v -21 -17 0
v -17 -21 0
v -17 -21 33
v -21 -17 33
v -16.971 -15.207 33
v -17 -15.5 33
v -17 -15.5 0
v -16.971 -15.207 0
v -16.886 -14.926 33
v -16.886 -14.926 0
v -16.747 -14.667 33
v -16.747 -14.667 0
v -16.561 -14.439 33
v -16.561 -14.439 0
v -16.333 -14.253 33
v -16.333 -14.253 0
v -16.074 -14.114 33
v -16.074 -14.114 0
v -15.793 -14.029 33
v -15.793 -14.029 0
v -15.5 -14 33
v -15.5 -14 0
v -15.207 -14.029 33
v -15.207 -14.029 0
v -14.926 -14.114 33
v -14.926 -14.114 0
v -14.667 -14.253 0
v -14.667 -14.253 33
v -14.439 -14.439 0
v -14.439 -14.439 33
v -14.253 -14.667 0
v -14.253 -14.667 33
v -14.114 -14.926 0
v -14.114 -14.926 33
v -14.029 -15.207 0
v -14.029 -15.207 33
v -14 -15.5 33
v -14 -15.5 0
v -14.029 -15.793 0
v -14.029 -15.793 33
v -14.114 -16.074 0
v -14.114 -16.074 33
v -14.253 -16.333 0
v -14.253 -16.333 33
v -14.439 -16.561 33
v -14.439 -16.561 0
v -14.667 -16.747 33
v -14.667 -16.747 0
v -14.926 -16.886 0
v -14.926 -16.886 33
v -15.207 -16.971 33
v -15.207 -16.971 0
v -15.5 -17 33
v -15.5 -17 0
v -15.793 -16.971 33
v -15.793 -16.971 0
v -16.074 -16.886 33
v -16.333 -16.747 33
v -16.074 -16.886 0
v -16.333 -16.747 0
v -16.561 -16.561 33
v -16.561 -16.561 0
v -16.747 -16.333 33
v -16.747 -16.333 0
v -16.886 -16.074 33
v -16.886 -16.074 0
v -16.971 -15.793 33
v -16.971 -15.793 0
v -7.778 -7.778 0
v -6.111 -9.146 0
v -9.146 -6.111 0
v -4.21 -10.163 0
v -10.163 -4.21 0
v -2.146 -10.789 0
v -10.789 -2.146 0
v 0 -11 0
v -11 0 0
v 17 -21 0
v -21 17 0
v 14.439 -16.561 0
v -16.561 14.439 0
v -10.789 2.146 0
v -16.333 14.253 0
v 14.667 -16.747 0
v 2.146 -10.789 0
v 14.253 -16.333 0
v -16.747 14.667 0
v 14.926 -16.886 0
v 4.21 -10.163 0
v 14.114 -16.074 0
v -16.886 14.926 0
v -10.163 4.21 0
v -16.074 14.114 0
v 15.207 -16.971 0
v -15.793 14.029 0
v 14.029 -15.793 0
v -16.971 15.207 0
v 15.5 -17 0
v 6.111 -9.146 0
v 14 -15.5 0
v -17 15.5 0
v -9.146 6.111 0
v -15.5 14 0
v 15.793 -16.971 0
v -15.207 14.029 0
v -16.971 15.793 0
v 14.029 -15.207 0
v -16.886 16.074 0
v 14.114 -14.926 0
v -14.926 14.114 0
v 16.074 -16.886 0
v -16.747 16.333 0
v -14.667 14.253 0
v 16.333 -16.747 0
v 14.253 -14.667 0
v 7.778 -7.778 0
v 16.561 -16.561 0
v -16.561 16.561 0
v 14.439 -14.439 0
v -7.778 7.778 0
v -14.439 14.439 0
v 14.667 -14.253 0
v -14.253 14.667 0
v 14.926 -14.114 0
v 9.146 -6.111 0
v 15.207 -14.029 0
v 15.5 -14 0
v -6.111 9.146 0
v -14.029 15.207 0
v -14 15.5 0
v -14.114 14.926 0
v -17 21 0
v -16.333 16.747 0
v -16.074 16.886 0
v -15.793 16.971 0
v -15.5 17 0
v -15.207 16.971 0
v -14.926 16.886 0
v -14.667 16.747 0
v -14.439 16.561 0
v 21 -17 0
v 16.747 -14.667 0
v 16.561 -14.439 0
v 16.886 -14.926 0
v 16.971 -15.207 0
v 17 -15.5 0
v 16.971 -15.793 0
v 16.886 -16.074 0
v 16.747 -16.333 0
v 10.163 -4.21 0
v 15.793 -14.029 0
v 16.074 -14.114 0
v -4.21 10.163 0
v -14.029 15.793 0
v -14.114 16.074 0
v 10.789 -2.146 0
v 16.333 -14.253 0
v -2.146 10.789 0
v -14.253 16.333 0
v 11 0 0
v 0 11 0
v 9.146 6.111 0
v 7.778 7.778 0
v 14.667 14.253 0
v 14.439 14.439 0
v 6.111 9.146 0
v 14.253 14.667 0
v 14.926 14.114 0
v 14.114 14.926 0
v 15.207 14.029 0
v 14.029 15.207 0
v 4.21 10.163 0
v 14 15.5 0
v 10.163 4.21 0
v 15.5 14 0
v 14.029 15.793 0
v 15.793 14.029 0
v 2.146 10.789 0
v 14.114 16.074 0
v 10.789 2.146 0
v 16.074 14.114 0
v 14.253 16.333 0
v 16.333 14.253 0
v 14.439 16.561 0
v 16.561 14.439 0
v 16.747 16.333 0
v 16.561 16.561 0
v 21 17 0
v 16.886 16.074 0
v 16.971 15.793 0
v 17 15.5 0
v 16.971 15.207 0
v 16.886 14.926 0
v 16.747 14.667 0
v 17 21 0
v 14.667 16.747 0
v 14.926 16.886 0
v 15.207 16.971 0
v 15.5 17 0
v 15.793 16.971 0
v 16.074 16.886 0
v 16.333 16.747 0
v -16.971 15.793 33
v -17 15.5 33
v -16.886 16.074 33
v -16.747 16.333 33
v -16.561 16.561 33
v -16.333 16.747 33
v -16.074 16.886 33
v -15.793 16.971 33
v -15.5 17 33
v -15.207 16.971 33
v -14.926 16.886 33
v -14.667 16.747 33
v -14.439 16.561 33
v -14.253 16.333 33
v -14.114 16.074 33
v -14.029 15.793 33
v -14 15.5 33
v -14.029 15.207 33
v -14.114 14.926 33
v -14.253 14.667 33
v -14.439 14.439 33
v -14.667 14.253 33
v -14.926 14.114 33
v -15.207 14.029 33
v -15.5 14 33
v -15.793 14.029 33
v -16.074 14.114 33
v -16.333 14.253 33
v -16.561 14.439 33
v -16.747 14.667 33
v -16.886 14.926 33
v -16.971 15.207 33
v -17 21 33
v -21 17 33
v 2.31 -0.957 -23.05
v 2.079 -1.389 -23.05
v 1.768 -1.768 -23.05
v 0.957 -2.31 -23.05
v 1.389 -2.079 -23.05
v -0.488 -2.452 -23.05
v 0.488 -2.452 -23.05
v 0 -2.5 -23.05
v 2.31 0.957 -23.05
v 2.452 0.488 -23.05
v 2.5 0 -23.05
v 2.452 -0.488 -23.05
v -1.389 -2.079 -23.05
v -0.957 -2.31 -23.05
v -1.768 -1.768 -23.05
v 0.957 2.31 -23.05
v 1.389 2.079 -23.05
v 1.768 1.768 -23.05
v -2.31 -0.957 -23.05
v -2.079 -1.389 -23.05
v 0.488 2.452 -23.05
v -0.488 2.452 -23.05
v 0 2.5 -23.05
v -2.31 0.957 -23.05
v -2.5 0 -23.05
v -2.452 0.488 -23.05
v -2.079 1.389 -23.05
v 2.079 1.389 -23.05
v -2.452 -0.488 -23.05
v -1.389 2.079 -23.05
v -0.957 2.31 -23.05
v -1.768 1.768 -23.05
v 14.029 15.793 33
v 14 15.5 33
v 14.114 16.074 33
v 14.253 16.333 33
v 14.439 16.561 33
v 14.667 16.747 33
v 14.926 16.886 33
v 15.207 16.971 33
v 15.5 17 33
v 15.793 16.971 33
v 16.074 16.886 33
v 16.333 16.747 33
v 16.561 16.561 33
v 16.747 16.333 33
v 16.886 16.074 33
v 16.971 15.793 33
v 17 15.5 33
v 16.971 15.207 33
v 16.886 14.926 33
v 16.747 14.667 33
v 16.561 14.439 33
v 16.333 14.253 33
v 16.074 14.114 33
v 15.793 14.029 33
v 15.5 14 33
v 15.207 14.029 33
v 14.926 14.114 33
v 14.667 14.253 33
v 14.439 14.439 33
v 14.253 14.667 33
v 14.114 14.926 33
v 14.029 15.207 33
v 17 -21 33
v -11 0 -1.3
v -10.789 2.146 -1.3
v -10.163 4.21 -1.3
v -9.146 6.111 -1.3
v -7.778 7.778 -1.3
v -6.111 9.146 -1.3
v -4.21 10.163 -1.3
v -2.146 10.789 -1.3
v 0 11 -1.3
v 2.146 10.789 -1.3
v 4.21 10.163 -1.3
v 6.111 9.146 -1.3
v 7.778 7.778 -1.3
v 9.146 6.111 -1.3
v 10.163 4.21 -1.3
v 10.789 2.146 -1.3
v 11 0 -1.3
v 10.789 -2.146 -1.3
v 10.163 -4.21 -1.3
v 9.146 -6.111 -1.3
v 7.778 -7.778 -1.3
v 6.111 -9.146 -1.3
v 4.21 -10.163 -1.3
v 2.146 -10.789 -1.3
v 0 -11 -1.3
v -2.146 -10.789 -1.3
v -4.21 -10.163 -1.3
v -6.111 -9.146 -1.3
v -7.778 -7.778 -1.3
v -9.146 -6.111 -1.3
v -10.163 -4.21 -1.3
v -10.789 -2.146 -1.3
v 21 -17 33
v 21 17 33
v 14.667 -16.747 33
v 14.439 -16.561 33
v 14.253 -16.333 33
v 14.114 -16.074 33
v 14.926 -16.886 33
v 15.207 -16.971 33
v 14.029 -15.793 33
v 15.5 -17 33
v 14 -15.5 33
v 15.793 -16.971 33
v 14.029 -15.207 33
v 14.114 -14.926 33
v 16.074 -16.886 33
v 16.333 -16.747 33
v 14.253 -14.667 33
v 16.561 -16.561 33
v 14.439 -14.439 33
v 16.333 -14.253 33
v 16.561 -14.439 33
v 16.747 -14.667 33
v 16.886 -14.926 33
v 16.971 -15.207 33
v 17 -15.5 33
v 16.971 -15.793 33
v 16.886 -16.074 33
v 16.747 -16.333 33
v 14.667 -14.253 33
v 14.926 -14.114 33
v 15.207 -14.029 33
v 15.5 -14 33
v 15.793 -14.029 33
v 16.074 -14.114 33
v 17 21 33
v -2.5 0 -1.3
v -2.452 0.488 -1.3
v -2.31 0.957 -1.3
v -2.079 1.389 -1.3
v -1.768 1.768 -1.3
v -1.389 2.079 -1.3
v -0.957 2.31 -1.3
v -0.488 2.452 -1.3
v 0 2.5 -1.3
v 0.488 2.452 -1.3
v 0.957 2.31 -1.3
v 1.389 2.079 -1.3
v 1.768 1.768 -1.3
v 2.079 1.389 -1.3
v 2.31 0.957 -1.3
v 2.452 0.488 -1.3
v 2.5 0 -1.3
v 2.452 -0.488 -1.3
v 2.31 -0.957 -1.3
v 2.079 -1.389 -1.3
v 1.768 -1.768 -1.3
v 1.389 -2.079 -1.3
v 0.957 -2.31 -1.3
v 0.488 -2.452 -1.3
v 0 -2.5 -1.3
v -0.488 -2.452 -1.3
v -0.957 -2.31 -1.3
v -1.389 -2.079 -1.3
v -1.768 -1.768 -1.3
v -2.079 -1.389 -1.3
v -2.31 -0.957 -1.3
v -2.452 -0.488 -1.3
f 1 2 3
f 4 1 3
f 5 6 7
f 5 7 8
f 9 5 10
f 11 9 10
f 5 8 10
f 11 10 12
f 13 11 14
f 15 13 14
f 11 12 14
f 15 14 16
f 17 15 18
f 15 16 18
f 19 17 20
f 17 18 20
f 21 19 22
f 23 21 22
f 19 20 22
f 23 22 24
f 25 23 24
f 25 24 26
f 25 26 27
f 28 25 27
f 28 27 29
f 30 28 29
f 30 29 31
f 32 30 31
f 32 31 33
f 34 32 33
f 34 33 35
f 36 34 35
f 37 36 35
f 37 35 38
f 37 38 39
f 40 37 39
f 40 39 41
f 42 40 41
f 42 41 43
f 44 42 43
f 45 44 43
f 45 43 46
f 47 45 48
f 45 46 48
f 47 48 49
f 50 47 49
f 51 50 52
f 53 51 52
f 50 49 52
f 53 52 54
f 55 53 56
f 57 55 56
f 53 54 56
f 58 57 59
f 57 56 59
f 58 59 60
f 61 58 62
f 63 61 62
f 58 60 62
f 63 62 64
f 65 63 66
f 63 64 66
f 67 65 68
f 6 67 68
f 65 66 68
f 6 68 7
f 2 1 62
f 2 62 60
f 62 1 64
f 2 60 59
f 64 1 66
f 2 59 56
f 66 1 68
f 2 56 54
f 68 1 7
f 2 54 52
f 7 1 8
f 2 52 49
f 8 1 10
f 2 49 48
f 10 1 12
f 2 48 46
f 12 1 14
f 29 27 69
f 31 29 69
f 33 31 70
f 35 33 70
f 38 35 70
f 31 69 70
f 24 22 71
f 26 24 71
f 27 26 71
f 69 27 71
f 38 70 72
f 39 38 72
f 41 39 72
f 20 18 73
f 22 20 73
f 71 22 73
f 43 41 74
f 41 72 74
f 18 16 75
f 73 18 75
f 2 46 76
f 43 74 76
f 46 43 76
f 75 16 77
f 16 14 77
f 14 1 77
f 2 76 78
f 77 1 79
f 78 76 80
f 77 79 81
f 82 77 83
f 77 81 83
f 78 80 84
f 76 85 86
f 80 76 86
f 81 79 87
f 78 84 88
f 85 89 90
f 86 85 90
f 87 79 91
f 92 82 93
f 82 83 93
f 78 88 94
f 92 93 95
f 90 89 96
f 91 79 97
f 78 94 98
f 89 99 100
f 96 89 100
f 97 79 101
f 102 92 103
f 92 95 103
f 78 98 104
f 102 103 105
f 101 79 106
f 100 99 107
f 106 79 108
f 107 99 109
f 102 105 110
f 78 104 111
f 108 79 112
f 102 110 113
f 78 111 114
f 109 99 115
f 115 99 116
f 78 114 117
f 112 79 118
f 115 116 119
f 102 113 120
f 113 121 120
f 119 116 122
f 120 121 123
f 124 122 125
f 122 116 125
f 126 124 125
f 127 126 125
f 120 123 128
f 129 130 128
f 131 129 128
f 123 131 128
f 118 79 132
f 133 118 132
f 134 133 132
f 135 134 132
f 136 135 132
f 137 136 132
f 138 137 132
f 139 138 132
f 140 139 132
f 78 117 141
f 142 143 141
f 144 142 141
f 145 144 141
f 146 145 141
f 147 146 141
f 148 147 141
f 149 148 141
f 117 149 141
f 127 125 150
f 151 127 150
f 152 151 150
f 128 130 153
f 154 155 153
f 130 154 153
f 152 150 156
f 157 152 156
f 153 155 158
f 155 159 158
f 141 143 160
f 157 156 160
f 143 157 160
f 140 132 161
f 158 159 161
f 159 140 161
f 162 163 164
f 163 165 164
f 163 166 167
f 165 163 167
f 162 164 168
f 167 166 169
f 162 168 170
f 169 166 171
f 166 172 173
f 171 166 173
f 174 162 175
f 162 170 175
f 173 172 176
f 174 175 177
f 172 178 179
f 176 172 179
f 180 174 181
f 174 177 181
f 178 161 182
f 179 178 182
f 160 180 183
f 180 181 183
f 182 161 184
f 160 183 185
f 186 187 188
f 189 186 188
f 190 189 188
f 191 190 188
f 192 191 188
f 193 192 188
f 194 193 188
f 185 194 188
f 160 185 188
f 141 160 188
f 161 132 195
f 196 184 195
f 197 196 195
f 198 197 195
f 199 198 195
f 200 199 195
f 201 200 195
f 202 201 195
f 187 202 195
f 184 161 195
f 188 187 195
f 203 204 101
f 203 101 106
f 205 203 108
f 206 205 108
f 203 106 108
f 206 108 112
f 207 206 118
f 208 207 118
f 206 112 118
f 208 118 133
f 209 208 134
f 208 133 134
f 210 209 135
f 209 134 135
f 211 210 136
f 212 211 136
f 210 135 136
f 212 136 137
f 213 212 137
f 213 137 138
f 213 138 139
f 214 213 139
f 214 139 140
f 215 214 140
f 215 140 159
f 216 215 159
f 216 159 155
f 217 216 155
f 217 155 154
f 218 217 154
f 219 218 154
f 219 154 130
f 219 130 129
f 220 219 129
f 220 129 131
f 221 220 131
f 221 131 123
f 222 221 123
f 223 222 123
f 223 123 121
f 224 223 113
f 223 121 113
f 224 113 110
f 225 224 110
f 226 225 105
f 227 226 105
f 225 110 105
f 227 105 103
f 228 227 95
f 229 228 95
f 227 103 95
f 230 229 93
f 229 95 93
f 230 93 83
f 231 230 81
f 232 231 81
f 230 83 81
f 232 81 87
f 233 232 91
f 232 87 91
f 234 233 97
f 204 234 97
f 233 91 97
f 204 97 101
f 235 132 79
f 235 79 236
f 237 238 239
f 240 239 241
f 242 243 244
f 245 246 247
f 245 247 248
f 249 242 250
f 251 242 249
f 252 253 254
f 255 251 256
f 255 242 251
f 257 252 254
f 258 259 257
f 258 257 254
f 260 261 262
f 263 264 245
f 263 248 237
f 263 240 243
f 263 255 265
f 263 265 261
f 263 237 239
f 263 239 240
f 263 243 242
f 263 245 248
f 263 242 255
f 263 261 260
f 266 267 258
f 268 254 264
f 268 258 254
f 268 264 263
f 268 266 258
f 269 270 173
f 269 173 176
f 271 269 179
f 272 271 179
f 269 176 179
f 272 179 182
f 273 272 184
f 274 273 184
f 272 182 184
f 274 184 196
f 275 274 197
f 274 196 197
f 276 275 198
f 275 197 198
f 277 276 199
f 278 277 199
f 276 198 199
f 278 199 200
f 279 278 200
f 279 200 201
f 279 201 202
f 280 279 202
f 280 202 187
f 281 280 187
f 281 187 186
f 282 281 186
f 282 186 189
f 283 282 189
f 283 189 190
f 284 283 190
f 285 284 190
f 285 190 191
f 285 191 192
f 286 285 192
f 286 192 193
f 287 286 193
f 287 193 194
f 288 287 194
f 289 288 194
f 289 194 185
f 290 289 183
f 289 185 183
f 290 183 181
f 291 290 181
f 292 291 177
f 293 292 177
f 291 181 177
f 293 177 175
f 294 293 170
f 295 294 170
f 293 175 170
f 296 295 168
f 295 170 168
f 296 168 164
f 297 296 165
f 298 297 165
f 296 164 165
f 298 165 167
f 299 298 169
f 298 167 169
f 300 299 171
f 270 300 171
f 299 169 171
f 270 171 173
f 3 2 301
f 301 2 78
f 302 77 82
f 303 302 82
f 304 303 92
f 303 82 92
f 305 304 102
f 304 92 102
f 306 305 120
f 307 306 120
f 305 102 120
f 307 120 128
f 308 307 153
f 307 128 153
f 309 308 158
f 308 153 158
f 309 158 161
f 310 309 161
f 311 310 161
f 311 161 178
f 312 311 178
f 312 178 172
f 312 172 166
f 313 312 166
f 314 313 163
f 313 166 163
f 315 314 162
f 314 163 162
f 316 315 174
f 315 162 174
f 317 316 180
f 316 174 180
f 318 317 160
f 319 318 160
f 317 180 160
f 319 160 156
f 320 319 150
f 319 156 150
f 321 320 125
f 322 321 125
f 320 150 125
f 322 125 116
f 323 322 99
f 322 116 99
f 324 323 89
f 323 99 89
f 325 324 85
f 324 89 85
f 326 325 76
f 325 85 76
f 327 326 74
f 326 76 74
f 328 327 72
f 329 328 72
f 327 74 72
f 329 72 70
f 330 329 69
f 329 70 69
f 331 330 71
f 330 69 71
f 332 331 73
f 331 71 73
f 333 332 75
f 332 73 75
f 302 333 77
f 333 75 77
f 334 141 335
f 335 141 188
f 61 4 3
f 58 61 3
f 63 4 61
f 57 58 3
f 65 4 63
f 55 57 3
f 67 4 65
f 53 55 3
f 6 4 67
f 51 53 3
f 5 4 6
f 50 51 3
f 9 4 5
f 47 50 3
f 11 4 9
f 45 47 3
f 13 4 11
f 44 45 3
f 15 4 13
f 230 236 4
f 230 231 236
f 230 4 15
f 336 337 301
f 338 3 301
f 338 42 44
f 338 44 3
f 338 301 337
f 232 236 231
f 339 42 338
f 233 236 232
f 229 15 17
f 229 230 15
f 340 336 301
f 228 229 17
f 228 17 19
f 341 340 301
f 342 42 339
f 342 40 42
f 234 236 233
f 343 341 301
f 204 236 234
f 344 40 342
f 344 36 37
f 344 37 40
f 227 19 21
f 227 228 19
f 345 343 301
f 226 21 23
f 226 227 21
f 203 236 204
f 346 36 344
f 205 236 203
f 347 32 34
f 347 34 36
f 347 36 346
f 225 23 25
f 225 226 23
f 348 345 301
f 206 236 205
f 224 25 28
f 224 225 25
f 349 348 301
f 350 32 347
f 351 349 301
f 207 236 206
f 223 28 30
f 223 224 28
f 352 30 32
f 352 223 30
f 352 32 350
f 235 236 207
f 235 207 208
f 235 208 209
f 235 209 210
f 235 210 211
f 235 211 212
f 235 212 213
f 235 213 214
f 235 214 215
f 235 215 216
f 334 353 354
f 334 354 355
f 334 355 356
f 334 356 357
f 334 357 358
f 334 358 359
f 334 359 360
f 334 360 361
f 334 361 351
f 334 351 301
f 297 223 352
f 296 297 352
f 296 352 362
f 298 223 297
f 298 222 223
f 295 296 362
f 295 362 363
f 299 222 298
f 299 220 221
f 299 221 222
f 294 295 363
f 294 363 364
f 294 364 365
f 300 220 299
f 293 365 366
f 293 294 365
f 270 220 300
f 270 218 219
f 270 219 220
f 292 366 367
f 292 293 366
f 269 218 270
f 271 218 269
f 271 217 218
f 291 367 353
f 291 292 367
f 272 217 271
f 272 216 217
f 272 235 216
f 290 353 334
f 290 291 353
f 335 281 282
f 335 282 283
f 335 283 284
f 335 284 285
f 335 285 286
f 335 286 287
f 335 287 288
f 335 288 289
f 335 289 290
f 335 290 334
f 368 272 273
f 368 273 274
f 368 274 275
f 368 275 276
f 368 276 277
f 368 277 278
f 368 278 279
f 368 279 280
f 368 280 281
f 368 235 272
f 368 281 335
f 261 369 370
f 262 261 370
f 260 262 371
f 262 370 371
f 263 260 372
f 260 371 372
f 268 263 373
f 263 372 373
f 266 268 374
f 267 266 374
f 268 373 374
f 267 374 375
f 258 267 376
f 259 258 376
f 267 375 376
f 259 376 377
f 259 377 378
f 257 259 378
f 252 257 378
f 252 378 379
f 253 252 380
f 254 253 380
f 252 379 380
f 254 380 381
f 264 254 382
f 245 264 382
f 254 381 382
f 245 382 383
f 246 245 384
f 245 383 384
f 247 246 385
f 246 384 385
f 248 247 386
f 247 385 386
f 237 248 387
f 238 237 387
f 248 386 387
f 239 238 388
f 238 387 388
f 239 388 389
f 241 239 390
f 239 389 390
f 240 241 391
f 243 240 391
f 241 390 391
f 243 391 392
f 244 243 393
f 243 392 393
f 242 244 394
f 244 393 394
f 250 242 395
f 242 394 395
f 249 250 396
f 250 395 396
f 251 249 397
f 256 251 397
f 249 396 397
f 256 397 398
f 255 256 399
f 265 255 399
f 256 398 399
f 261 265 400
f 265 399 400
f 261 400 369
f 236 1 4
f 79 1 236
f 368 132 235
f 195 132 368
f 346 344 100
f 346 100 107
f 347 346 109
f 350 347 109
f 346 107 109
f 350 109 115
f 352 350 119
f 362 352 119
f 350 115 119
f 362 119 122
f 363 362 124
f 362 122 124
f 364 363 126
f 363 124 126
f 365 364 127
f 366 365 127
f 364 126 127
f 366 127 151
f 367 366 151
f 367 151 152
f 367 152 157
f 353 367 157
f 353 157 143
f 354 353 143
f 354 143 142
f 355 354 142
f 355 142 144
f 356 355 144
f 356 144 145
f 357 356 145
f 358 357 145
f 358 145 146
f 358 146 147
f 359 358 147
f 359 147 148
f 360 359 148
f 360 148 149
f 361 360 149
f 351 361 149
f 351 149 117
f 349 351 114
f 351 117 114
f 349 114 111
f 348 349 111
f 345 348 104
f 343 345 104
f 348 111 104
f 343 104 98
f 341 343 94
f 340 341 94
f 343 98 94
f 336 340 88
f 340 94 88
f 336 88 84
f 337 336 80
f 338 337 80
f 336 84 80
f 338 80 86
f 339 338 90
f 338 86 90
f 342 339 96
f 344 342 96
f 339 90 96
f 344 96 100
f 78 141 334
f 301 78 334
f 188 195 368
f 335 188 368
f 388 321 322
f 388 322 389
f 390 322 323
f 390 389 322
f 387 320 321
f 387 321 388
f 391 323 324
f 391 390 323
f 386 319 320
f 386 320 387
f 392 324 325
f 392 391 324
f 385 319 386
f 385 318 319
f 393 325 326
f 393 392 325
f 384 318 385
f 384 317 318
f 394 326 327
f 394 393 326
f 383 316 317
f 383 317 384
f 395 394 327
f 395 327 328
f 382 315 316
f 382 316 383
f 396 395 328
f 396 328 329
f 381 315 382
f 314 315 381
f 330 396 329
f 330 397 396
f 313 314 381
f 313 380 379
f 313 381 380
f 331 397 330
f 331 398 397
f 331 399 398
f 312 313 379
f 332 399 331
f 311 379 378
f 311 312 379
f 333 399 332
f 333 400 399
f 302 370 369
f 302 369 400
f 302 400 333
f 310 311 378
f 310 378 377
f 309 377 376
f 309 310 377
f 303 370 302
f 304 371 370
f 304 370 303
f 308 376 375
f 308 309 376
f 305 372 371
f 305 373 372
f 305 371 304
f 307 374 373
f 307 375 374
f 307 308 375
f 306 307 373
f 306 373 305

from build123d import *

# Parameters (mm, degrees)
SZKIC1_W                    = 42
SZKIC1_H                    = 42
DODANIE_WYCI_GNI_CIE1_DEPTH = 33
SFAZOWANIE1_SIZE            = 4
SZKIC2_R                    = 11
DODANIE_WYCI_GNI_CIE2_DEPTH = 1.3
SZKIC3_R                    = 2.5
DODANIE_WYCI_GNI_CIE3_DEPTH = 21.75
SZKIC4_R                    = 1.5
WYTNIJ_WYCI_GNI_CIE1_DEPTH  = 34


with BuildPart() as part:
    # Szkic1 → Dodanie-wyciągnięcie1 (new body)
    with BuildSketch(Plane.XY):
        Rectangle(SZKIC1_W, SZKIC1_H)
    extrude(amount=DODANIE_WYCI_GNI_CIE1_DEPTH)

    # Sfazowanie1
    sfazowanie1_edges = [part.edges().sort_by_distance(p)[0] for p in [
        (21, -21, 16.5),
        (-21, -21, 16.5),
        (-21, 21, 16.5),
        (21, 21, 16.5),
    ]]
    chamfer(sfazowanie1_edges, length=SFAZOWANIE1_SIZE)

    # Szkic2 → Dodanie-wyciągnięcie2 (add)
    with BuildSketch(Plane(origin=(0, 0, 0), x_dir=(-1, 0, 0), z_dir=(0, 0, -1))):
        Circle(SZKIC2_R)
    extrude(amount=DODANIE_WYCI_GNI_CIE2_DEPTH)

    # Szkic3 → Dodanie-wyciągnięcie3 (add)
    with BuildSketch(Plane(origin=(0, 0, -1.3), x_dir=(-1, 0, 0), z_dir=(0, 0, -1))):
        Circle(SZKIC3_R)
    extrude(amount=DODANIE_WYCI_GNI_CIE3_DEPTH)

    # Szkic4 → Wytnij-wyciągnięcie1 (cut, through all)
    with BuildSketch(Plane(origin=(0, 0, 0), x_dir=(-1, 0, 0), z_dir=(0, 0, -1))):
        with Locations((15.5, 15.5)):
            Circle(SZKIC4_R)
        with Locations((-15.5, 15.5)):
            Circle(SZKIC4_R)
        with Locations((-15.5, -15.5)):
            Circle(SZKIC4_R)
        with Locations((15.5, -15.5)):
            Circle(SZKIC4_R)
    extrude(amount=-WYTNIJ_WYCI_GNI_CIE1_DEPTH, mode=Mode.SUBTRACT)


solid = part.part
